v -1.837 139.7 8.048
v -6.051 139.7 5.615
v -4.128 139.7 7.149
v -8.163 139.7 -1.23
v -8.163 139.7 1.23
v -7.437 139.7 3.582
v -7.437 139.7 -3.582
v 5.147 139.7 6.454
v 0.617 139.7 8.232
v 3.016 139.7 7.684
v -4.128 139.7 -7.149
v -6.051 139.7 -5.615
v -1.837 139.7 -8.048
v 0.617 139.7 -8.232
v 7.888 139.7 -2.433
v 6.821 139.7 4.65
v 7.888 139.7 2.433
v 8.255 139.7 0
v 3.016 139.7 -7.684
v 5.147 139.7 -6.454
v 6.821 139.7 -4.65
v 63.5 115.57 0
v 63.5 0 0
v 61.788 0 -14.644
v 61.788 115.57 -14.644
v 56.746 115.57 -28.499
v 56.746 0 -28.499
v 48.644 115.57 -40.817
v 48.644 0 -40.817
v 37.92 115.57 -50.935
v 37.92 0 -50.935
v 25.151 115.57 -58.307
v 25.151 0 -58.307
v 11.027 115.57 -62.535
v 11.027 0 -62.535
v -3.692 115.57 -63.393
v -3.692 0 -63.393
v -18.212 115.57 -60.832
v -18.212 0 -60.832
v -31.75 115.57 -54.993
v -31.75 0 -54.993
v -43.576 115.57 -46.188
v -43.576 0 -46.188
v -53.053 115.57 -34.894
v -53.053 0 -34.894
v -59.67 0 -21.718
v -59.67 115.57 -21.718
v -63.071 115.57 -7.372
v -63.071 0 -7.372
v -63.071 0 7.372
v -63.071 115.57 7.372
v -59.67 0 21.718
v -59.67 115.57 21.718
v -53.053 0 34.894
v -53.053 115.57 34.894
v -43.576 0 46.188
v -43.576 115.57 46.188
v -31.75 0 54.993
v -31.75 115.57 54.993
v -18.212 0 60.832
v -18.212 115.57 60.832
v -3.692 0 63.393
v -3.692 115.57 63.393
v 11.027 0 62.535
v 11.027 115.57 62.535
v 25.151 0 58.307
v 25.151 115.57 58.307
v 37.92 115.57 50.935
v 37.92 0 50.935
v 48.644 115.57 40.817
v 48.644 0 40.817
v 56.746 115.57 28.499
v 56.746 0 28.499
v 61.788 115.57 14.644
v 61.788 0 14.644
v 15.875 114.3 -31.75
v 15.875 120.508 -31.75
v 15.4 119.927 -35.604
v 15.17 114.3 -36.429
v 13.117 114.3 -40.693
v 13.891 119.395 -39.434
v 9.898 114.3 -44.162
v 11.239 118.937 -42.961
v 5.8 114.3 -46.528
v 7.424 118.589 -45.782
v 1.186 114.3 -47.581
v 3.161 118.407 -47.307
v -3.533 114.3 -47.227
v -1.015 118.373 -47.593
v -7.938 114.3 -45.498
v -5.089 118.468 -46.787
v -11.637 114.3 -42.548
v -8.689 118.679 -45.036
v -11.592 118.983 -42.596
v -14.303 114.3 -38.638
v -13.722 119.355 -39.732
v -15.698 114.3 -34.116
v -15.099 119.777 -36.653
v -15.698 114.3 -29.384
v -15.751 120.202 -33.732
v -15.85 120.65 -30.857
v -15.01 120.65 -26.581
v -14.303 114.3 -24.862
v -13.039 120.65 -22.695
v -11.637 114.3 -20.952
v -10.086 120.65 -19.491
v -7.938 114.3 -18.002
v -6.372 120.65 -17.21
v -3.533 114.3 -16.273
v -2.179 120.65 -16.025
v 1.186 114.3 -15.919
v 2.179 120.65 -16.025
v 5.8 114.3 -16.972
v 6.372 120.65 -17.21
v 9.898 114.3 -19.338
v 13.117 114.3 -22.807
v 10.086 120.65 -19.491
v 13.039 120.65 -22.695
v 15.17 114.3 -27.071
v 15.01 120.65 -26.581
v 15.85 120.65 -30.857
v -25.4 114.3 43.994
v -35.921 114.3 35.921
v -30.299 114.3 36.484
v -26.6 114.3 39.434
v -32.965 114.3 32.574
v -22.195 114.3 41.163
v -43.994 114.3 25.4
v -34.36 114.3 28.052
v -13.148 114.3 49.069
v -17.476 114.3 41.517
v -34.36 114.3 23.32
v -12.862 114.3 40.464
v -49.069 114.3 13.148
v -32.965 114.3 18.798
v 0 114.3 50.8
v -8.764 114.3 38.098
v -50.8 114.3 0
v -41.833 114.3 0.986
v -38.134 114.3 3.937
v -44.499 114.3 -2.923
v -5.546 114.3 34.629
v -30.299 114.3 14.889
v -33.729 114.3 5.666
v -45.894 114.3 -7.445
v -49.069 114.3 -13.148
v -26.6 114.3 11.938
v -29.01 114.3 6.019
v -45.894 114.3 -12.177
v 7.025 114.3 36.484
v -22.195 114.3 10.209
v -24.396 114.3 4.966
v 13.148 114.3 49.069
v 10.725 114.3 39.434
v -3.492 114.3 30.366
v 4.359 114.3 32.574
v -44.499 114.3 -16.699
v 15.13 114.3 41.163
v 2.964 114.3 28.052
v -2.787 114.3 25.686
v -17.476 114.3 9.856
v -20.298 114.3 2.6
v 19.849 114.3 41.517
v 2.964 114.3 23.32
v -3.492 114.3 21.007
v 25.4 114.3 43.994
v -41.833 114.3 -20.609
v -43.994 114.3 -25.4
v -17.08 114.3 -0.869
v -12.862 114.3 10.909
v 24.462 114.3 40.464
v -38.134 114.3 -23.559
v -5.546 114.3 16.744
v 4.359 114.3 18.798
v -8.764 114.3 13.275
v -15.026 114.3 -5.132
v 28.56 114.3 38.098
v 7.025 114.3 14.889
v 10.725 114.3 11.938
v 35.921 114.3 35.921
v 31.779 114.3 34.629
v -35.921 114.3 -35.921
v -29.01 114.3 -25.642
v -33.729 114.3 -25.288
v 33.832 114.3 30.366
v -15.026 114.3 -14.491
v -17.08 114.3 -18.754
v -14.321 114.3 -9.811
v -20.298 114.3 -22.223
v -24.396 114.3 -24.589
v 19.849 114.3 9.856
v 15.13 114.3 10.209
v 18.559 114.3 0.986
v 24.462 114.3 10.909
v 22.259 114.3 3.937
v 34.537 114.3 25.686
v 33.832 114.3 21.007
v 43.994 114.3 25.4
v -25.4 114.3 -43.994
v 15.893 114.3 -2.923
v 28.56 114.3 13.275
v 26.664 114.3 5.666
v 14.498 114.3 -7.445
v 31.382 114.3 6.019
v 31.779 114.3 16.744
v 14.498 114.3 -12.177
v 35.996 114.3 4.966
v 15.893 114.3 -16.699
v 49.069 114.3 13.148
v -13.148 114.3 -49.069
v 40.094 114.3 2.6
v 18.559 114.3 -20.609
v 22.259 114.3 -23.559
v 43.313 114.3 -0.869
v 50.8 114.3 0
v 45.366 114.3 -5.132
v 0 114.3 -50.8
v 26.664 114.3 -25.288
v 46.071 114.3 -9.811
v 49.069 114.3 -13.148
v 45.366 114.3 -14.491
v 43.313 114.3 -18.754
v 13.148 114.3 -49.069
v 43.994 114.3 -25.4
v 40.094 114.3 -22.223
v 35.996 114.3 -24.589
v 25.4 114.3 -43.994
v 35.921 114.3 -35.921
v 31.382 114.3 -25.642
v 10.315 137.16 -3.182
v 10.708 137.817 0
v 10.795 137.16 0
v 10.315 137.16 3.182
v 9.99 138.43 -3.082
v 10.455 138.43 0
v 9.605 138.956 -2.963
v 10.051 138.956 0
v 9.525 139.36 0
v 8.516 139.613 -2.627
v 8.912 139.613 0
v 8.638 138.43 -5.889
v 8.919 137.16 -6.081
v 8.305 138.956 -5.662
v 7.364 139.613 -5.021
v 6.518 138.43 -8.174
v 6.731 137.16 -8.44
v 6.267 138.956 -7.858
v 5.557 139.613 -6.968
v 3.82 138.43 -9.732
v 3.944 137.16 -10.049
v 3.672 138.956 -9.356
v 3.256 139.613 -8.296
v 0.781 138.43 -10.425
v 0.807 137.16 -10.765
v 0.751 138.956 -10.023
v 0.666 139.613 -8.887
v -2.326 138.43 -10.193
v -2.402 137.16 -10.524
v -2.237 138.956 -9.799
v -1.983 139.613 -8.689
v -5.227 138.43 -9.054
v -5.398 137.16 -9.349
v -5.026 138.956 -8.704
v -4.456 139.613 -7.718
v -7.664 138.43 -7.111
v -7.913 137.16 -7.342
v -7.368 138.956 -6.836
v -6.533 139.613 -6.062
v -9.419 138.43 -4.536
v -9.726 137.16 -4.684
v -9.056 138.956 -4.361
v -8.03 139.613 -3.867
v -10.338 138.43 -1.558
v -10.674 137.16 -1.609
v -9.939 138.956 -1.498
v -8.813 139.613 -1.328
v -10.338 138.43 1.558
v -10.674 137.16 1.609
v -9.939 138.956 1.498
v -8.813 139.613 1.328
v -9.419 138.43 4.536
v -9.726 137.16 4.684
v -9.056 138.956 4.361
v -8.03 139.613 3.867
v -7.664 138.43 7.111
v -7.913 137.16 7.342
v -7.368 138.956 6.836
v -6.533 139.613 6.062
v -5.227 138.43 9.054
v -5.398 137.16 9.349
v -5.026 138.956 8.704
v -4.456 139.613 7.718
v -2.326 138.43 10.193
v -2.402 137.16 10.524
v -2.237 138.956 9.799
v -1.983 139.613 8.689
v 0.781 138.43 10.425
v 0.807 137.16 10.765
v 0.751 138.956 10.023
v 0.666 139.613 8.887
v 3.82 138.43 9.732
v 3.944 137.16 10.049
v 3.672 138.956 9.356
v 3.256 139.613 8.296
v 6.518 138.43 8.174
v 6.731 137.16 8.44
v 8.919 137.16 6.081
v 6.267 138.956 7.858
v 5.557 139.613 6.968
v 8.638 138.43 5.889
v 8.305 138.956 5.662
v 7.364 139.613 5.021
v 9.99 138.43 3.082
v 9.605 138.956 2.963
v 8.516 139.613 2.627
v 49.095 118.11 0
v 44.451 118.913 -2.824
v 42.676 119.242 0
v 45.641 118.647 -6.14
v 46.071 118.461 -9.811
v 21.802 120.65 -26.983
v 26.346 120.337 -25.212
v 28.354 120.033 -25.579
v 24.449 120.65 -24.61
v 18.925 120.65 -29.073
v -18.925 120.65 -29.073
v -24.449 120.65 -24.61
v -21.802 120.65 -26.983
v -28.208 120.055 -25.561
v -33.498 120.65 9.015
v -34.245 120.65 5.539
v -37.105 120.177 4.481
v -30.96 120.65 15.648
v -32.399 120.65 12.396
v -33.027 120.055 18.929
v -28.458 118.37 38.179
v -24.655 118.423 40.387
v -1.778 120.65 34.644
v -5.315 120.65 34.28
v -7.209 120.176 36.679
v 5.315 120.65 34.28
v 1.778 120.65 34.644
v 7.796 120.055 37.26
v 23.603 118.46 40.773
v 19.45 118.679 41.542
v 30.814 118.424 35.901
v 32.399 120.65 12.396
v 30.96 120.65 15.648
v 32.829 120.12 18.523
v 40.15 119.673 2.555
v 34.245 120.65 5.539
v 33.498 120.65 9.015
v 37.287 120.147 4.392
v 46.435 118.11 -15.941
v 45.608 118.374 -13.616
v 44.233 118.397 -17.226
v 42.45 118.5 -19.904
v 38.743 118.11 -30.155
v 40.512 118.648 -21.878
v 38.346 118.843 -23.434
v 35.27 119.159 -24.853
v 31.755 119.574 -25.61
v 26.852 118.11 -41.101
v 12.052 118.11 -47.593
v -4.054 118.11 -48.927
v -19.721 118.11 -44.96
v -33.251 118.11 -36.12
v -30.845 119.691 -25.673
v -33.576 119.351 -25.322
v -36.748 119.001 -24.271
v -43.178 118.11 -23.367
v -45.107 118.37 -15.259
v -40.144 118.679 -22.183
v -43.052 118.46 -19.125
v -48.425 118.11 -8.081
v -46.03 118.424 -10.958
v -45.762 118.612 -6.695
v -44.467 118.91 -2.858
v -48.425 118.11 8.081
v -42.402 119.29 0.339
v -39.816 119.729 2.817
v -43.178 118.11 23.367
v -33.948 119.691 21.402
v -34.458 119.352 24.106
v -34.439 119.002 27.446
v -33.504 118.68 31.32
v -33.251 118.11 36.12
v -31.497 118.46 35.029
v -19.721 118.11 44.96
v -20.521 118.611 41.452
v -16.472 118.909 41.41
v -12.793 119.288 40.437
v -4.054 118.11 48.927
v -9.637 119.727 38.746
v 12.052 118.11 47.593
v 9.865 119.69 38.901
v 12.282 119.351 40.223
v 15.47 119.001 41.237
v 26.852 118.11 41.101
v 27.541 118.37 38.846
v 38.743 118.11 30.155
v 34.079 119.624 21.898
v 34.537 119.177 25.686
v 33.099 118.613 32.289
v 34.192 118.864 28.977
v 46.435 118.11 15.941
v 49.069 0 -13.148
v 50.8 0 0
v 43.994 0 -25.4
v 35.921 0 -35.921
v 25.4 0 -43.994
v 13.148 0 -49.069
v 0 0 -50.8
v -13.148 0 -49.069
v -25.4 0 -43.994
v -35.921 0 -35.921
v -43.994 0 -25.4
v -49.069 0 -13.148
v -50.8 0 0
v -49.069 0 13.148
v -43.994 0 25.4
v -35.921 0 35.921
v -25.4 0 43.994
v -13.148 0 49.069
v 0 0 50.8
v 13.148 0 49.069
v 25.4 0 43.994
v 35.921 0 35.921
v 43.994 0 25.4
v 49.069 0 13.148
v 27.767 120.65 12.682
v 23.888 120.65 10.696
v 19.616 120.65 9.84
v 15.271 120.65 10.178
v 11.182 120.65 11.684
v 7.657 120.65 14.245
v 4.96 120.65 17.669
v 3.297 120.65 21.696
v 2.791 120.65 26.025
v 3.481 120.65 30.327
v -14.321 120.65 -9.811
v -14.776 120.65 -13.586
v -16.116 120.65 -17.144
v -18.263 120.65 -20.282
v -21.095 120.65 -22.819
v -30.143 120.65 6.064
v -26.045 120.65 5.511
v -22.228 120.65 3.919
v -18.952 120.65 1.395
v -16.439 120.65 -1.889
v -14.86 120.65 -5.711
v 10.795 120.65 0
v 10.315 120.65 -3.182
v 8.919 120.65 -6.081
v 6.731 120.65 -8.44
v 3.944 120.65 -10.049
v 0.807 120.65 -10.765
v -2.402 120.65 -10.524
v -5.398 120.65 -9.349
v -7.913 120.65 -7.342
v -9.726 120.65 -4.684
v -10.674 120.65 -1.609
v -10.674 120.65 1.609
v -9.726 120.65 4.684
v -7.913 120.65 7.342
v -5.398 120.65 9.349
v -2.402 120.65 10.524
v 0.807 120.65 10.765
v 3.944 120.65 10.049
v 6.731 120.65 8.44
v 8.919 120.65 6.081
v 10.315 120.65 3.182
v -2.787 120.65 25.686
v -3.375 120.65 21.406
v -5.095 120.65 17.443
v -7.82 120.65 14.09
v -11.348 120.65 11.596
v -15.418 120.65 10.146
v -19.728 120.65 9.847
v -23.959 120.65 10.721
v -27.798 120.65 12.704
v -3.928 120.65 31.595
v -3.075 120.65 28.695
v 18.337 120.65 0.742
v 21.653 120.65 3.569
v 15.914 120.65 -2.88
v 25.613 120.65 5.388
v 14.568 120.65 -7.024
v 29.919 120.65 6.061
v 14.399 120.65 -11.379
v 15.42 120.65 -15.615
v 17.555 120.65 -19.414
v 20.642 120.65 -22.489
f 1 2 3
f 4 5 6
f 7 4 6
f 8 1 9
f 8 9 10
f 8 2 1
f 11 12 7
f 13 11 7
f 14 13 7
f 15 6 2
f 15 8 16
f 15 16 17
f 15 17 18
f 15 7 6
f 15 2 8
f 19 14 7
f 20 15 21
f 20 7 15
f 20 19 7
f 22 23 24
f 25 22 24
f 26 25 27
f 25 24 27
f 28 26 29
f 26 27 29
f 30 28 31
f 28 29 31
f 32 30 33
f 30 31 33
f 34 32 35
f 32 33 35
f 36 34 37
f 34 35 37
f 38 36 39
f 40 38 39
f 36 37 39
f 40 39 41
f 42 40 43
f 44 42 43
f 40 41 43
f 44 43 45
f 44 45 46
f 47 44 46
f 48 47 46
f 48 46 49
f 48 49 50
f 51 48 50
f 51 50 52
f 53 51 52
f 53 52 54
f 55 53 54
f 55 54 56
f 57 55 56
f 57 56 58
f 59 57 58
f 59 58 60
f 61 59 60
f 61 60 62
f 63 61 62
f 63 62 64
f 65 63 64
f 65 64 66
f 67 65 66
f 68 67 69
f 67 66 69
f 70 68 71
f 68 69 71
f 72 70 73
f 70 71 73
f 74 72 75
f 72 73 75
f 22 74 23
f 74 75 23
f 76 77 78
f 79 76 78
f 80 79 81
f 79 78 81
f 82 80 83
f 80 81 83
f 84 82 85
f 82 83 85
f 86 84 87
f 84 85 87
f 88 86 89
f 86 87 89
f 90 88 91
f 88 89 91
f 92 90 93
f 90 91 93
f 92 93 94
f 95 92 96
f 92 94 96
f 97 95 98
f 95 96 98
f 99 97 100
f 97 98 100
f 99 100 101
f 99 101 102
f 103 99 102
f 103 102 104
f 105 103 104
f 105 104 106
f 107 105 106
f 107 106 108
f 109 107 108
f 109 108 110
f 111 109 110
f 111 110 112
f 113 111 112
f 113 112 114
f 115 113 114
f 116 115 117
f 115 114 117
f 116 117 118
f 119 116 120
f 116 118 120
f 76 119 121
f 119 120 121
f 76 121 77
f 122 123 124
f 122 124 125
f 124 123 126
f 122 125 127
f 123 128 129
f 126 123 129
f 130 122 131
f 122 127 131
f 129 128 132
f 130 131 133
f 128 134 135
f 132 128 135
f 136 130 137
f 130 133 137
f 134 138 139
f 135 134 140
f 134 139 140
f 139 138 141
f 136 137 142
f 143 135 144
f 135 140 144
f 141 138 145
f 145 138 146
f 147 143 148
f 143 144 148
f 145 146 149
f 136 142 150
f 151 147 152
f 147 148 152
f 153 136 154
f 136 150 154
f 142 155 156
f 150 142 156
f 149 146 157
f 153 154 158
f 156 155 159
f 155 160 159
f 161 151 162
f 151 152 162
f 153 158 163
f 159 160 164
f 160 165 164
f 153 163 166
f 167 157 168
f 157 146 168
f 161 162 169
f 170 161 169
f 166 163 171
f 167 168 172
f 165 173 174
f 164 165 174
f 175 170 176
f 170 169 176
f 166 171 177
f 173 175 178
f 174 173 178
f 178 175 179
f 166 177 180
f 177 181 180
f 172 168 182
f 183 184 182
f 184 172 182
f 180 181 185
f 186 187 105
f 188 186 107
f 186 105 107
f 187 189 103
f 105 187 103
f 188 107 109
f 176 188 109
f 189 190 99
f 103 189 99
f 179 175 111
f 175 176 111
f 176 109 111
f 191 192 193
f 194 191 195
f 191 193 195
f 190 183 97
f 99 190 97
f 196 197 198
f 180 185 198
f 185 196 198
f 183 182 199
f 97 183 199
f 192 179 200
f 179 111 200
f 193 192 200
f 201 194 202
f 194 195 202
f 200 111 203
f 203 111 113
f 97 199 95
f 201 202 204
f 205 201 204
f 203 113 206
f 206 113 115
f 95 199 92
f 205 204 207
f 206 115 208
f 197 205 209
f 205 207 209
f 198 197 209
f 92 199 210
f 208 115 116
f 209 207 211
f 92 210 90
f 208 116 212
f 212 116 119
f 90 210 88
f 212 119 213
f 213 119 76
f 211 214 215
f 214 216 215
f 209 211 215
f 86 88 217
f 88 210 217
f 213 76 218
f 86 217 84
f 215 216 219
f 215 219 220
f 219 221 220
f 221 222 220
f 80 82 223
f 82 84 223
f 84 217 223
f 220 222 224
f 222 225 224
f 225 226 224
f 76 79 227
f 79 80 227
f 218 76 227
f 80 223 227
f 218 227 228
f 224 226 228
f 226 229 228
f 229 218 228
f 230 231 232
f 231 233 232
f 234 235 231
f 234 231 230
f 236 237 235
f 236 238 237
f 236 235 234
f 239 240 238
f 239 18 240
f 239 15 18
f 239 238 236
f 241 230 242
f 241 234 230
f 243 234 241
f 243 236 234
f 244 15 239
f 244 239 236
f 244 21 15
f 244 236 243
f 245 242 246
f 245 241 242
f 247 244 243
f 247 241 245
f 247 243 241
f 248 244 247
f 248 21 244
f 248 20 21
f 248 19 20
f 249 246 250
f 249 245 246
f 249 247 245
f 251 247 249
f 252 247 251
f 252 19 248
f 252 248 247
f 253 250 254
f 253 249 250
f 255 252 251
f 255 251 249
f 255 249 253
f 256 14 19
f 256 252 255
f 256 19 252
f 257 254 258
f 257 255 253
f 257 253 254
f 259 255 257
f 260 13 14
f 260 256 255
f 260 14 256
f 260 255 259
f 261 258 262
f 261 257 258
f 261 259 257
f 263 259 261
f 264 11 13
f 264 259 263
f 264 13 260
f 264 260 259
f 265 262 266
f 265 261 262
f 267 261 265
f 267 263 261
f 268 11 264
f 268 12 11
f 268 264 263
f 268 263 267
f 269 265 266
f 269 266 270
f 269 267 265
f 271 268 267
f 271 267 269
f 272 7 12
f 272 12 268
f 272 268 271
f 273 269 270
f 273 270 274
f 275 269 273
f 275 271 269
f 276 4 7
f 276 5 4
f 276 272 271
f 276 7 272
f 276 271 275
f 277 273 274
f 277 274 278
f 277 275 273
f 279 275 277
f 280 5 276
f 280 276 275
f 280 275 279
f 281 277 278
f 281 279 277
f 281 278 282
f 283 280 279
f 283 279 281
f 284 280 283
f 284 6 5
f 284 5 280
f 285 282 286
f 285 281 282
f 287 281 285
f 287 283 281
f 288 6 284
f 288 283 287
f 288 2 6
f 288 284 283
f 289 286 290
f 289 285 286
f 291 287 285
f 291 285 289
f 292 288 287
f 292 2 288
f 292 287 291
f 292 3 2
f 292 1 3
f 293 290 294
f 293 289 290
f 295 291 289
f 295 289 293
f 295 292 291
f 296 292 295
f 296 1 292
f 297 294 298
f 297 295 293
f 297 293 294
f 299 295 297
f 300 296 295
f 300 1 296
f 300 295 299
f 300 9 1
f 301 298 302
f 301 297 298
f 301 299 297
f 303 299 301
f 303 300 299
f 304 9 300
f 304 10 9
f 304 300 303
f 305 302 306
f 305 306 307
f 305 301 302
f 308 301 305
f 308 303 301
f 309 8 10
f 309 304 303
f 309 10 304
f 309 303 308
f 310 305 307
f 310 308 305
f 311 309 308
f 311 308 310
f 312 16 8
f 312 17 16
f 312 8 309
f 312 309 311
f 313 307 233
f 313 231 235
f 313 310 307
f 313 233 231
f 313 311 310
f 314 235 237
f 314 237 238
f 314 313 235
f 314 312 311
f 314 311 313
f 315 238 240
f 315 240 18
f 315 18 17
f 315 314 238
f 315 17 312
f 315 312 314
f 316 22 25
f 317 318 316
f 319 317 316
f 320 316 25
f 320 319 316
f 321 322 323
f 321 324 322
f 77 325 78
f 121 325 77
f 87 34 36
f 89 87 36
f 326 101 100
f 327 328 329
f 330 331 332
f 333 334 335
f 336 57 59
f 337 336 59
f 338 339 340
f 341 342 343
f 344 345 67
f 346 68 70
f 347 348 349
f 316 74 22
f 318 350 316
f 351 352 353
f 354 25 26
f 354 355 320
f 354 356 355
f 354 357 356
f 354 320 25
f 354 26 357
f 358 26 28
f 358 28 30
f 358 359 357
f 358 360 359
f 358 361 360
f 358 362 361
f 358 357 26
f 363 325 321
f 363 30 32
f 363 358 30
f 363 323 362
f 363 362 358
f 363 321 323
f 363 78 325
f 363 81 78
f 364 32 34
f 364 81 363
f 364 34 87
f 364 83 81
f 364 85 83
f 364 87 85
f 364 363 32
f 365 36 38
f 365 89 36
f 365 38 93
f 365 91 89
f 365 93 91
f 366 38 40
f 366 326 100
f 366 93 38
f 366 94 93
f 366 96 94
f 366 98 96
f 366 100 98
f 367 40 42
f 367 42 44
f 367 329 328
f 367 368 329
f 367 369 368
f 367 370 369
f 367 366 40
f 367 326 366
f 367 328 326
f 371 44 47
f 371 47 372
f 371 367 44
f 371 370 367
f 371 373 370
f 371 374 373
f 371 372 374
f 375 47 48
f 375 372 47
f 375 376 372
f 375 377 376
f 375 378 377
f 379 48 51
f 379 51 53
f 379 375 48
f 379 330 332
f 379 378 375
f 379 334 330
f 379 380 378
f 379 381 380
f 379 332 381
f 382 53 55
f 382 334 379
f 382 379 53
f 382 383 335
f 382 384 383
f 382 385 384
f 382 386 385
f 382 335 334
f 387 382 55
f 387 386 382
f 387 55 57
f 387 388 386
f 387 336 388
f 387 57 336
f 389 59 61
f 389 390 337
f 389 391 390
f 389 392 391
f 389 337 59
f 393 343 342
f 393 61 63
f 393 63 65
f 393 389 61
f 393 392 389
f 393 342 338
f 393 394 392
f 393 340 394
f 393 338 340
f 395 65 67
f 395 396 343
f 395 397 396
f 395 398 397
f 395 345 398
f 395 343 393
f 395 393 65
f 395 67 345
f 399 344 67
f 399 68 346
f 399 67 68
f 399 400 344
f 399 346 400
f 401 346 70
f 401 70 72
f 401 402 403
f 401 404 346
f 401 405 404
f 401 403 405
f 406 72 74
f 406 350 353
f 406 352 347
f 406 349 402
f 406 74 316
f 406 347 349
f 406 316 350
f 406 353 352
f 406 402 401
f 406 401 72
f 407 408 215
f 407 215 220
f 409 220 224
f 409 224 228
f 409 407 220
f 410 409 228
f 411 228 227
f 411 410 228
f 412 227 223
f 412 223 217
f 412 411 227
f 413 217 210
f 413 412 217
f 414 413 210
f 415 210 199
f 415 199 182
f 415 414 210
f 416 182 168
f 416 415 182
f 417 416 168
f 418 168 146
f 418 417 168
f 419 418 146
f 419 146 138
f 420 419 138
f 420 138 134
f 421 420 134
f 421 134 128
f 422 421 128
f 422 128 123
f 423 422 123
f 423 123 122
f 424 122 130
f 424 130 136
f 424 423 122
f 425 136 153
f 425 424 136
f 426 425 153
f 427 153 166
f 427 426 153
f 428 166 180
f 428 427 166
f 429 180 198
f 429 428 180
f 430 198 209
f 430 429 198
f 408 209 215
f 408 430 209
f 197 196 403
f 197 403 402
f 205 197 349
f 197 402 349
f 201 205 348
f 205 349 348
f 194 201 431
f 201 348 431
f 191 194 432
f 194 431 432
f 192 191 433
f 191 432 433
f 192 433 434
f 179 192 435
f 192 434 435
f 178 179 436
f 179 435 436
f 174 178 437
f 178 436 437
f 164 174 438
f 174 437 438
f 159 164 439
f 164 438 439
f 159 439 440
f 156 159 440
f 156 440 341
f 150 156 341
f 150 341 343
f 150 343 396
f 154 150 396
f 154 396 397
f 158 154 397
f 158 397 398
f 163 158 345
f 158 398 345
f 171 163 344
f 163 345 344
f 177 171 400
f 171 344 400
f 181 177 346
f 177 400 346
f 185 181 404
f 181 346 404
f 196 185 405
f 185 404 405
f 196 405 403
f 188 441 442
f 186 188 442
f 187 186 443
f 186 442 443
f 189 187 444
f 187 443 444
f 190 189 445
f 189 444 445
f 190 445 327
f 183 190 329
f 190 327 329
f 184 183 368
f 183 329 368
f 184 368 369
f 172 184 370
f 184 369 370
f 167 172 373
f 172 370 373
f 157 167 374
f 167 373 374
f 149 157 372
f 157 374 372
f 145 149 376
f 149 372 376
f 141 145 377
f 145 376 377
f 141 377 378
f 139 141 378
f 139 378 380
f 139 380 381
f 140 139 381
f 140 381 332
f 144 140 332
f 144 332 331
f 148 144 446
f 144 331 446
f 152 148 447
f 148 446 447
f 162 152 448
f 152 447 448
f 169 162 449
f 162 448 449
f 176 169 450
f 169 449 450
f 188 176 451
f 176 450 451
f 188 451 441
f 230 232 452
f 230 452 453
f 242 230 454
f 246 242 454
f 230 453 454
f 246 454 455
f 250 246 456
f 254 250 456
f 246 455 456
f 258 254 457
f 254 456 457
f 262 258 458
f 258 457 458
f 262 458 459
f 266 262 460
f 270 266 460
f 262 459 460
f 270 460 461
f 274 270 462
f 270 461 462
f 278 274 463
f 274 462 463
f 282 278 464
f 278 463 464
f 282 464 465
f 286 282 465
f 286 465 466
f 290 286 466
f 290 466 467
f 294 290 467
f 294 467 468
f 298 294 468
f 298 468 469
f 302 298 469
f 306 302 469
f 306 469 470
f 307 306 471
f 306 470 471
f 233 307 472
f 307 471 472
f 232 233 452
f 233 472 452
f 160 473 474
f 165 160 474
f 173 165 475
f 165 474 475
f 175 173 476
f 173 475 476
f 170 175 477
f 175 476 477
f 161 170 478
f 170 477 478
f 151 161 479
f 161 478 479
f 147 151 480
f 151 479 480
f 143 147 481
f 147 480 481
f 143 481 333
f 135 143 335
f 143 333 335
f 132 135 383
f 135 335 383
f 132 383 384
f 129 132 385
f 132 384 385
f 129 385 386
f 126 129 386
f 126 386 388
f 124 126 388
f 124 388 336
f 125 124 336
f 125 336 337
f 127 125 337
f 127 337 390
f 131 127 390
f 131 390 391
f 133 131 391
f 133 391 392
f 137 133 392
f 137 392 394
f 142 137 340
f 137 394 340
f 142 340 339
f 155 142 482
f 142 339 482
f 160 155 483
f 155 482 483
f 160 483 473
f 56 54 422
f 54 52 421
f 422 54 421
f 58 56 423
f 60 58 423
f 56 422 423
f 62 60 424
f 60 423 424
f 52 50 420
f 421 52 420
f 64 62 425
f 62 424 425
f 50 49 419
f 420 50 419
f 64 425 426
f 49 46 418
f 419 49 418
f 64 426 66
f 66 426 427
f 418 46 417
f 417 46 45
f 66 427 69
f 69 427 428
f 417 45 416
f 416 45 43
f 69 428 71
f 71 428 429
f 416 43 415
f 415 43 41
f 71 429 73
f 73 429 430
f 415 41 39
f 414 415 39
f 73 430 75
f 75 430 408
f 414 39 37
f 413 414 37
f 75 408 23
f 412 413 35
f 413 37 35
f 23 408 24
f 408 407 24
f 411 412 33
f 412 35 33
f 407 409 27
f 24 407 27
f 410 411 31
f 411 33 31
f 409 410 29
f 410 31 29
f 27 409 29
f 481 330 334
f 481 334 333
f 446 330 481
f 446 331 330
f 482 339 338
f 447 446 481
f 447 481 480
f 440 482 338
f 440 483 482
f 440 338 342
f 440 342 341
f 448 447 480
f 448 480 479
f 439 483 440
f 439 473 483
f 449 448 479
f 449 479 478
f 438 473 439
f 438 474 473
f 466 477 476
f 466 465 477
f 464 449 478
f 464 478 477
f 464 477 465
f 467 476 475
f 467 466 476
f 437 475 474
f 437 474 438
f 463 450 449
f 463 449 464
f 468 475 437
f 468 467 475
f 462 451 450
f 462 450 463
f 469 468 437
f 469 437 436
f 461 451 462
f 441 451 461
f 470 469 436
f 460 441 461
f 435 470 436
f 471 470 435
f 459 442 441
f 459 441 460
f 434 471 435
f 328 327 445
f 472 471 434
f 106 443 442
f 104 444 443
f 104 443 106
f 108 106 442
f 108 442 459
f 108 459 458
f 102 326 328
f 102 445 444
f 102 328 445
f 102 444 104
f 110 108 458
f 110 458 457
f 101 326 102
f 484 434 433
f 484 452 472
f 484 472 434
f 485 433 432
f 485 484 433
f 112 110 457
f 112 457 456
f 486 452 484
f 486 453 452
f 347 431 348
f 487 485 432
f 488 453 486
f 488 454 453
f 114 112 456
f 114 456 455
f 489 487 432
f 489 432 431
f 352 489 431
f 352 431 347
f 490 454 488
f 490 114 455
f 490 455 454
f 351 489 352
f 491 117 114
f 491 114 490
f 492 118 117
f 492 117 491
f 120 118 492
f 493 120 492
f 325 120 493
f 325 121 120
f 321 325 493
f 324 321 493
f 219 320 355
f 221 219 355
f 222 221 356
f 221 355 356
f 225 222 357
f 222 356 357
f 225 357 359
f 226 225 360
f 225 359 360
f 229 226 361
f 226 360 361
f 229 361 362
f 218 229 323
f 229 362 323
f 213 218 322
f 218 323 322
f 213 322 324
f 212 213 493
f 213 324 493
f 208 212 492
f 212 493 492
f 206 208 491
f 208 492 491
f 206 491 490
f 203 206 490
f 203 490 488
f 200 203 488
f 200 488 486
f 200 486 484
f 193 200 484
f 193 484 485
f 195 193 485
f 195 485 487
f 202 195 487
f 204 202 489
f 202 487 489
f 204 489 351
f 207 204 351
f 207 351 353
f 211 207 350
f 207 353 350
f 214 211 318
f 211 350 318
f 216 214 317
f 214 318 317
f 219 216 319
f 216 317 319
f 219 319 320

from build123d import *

# Parameters (mm, degrees)
SKETCH1_R           = 63.5
SKETCH1_R_2         = 50.8
BOSS_EXTRUDE1_DEPTH = 114.3
SKETCH2_R           = 63.5
BOSS_EXTRUDE2_DEPTH = 6.35
CHAMFER1_SIZE       = 5.08
CHAMFER1_SIZE2      = 28.810111644
SKETCH3_R           = 15.875
CUT_EXTRUDE1_DEPTH  = 121.65
SKETCH4_R           = 10.795
BOSS_EXTRUDE3_DEPTH = 19.05
FILLET1_R           = 2.54


with BuildPart() as part:
    # Sketch1 → Boss-Extrude1 (new body)
    with BuildSketch(Plane(origin=(0, 0, 0), x_dir=(1, 0, 0), z_dir=(0, 1, 0))):
        Circle(SKETCH1_R)
        Circle(SKETCH1_R_2, mode=Mode.SUBTRACT)
    extrude(amount=BOSS_EXTRUDE1_DEPTH)

    # Sketch2 → Boss-Extrude2 (add)
    with BuildSketch(Plane(origin=(0, 114.3, 0), x_dir=(1, 0, 0), z_dir=(0, 1, 0))):
        Circle(SKETCH2_R)
    extrude(amount=BOSS_EXTRUDE2_DEPTH)

    # Chamfer1
    chamfer1_edges = [part.edges().sort_by_distance(p)[0] for p in [
        (-63.5, 120.65, 0),
    ]]
    chamfer1_side = [part.faces().sort_by_distance(p)[0] for p in [
        (-63.5, 60.325, 0),
    ]]
    chamfer(chamfer1_edges, length=CHAMFER1_SIZE, length2=CHAMFER1_SIZE2, reference=chamfer1_side[0])

    # Sketch3 → Cut-Extrude1 (cut, through all)
    with BuildSketch(Plane(origin=(0, 120.65, 0), x_dir=(1, 0, 0), z_dir=(0, 1, 0))):
        with Locations((0, 31.75)):
            Circle(SKETCH3_R)
        with Locations((30.196044392, 9.811289571)):
            Circle(SKETCH3_R)
        with Locations((18.66218176, -25.686289571)):
            Circle(SKETCH3_R)
        with Locations((-18.66218176, -25.686289571)):
            Circle(SKETCH3_R)
        with Locations((-30.196044392, 9.811289571)):
            Circle(SKETCH3_R)
    extrude(amount=-CUT_EXTRUDE1_DEPTH, mode=Mode.SUBTRACT)

    # Sketch4 → Boss-Extrude3 (add)
    with BuildSketch(Plane(origin=(0, 120.65, 0), x_dir=(1, 0, 0), z_dir=(0, 1, 0))):
        Circle(SKETCH4_R)
    extrude(amount=BOSS_EXTRUDE3_DEPTH)

    # Fillet1
    fillet1_edges = [part.edges().sort_by_distance(p)[0] for p in [
        (-10.795, 139.7, 0),
    ]]
    fillet(fillet1_edges, radius=FILLET1_R)


solid = part.part
